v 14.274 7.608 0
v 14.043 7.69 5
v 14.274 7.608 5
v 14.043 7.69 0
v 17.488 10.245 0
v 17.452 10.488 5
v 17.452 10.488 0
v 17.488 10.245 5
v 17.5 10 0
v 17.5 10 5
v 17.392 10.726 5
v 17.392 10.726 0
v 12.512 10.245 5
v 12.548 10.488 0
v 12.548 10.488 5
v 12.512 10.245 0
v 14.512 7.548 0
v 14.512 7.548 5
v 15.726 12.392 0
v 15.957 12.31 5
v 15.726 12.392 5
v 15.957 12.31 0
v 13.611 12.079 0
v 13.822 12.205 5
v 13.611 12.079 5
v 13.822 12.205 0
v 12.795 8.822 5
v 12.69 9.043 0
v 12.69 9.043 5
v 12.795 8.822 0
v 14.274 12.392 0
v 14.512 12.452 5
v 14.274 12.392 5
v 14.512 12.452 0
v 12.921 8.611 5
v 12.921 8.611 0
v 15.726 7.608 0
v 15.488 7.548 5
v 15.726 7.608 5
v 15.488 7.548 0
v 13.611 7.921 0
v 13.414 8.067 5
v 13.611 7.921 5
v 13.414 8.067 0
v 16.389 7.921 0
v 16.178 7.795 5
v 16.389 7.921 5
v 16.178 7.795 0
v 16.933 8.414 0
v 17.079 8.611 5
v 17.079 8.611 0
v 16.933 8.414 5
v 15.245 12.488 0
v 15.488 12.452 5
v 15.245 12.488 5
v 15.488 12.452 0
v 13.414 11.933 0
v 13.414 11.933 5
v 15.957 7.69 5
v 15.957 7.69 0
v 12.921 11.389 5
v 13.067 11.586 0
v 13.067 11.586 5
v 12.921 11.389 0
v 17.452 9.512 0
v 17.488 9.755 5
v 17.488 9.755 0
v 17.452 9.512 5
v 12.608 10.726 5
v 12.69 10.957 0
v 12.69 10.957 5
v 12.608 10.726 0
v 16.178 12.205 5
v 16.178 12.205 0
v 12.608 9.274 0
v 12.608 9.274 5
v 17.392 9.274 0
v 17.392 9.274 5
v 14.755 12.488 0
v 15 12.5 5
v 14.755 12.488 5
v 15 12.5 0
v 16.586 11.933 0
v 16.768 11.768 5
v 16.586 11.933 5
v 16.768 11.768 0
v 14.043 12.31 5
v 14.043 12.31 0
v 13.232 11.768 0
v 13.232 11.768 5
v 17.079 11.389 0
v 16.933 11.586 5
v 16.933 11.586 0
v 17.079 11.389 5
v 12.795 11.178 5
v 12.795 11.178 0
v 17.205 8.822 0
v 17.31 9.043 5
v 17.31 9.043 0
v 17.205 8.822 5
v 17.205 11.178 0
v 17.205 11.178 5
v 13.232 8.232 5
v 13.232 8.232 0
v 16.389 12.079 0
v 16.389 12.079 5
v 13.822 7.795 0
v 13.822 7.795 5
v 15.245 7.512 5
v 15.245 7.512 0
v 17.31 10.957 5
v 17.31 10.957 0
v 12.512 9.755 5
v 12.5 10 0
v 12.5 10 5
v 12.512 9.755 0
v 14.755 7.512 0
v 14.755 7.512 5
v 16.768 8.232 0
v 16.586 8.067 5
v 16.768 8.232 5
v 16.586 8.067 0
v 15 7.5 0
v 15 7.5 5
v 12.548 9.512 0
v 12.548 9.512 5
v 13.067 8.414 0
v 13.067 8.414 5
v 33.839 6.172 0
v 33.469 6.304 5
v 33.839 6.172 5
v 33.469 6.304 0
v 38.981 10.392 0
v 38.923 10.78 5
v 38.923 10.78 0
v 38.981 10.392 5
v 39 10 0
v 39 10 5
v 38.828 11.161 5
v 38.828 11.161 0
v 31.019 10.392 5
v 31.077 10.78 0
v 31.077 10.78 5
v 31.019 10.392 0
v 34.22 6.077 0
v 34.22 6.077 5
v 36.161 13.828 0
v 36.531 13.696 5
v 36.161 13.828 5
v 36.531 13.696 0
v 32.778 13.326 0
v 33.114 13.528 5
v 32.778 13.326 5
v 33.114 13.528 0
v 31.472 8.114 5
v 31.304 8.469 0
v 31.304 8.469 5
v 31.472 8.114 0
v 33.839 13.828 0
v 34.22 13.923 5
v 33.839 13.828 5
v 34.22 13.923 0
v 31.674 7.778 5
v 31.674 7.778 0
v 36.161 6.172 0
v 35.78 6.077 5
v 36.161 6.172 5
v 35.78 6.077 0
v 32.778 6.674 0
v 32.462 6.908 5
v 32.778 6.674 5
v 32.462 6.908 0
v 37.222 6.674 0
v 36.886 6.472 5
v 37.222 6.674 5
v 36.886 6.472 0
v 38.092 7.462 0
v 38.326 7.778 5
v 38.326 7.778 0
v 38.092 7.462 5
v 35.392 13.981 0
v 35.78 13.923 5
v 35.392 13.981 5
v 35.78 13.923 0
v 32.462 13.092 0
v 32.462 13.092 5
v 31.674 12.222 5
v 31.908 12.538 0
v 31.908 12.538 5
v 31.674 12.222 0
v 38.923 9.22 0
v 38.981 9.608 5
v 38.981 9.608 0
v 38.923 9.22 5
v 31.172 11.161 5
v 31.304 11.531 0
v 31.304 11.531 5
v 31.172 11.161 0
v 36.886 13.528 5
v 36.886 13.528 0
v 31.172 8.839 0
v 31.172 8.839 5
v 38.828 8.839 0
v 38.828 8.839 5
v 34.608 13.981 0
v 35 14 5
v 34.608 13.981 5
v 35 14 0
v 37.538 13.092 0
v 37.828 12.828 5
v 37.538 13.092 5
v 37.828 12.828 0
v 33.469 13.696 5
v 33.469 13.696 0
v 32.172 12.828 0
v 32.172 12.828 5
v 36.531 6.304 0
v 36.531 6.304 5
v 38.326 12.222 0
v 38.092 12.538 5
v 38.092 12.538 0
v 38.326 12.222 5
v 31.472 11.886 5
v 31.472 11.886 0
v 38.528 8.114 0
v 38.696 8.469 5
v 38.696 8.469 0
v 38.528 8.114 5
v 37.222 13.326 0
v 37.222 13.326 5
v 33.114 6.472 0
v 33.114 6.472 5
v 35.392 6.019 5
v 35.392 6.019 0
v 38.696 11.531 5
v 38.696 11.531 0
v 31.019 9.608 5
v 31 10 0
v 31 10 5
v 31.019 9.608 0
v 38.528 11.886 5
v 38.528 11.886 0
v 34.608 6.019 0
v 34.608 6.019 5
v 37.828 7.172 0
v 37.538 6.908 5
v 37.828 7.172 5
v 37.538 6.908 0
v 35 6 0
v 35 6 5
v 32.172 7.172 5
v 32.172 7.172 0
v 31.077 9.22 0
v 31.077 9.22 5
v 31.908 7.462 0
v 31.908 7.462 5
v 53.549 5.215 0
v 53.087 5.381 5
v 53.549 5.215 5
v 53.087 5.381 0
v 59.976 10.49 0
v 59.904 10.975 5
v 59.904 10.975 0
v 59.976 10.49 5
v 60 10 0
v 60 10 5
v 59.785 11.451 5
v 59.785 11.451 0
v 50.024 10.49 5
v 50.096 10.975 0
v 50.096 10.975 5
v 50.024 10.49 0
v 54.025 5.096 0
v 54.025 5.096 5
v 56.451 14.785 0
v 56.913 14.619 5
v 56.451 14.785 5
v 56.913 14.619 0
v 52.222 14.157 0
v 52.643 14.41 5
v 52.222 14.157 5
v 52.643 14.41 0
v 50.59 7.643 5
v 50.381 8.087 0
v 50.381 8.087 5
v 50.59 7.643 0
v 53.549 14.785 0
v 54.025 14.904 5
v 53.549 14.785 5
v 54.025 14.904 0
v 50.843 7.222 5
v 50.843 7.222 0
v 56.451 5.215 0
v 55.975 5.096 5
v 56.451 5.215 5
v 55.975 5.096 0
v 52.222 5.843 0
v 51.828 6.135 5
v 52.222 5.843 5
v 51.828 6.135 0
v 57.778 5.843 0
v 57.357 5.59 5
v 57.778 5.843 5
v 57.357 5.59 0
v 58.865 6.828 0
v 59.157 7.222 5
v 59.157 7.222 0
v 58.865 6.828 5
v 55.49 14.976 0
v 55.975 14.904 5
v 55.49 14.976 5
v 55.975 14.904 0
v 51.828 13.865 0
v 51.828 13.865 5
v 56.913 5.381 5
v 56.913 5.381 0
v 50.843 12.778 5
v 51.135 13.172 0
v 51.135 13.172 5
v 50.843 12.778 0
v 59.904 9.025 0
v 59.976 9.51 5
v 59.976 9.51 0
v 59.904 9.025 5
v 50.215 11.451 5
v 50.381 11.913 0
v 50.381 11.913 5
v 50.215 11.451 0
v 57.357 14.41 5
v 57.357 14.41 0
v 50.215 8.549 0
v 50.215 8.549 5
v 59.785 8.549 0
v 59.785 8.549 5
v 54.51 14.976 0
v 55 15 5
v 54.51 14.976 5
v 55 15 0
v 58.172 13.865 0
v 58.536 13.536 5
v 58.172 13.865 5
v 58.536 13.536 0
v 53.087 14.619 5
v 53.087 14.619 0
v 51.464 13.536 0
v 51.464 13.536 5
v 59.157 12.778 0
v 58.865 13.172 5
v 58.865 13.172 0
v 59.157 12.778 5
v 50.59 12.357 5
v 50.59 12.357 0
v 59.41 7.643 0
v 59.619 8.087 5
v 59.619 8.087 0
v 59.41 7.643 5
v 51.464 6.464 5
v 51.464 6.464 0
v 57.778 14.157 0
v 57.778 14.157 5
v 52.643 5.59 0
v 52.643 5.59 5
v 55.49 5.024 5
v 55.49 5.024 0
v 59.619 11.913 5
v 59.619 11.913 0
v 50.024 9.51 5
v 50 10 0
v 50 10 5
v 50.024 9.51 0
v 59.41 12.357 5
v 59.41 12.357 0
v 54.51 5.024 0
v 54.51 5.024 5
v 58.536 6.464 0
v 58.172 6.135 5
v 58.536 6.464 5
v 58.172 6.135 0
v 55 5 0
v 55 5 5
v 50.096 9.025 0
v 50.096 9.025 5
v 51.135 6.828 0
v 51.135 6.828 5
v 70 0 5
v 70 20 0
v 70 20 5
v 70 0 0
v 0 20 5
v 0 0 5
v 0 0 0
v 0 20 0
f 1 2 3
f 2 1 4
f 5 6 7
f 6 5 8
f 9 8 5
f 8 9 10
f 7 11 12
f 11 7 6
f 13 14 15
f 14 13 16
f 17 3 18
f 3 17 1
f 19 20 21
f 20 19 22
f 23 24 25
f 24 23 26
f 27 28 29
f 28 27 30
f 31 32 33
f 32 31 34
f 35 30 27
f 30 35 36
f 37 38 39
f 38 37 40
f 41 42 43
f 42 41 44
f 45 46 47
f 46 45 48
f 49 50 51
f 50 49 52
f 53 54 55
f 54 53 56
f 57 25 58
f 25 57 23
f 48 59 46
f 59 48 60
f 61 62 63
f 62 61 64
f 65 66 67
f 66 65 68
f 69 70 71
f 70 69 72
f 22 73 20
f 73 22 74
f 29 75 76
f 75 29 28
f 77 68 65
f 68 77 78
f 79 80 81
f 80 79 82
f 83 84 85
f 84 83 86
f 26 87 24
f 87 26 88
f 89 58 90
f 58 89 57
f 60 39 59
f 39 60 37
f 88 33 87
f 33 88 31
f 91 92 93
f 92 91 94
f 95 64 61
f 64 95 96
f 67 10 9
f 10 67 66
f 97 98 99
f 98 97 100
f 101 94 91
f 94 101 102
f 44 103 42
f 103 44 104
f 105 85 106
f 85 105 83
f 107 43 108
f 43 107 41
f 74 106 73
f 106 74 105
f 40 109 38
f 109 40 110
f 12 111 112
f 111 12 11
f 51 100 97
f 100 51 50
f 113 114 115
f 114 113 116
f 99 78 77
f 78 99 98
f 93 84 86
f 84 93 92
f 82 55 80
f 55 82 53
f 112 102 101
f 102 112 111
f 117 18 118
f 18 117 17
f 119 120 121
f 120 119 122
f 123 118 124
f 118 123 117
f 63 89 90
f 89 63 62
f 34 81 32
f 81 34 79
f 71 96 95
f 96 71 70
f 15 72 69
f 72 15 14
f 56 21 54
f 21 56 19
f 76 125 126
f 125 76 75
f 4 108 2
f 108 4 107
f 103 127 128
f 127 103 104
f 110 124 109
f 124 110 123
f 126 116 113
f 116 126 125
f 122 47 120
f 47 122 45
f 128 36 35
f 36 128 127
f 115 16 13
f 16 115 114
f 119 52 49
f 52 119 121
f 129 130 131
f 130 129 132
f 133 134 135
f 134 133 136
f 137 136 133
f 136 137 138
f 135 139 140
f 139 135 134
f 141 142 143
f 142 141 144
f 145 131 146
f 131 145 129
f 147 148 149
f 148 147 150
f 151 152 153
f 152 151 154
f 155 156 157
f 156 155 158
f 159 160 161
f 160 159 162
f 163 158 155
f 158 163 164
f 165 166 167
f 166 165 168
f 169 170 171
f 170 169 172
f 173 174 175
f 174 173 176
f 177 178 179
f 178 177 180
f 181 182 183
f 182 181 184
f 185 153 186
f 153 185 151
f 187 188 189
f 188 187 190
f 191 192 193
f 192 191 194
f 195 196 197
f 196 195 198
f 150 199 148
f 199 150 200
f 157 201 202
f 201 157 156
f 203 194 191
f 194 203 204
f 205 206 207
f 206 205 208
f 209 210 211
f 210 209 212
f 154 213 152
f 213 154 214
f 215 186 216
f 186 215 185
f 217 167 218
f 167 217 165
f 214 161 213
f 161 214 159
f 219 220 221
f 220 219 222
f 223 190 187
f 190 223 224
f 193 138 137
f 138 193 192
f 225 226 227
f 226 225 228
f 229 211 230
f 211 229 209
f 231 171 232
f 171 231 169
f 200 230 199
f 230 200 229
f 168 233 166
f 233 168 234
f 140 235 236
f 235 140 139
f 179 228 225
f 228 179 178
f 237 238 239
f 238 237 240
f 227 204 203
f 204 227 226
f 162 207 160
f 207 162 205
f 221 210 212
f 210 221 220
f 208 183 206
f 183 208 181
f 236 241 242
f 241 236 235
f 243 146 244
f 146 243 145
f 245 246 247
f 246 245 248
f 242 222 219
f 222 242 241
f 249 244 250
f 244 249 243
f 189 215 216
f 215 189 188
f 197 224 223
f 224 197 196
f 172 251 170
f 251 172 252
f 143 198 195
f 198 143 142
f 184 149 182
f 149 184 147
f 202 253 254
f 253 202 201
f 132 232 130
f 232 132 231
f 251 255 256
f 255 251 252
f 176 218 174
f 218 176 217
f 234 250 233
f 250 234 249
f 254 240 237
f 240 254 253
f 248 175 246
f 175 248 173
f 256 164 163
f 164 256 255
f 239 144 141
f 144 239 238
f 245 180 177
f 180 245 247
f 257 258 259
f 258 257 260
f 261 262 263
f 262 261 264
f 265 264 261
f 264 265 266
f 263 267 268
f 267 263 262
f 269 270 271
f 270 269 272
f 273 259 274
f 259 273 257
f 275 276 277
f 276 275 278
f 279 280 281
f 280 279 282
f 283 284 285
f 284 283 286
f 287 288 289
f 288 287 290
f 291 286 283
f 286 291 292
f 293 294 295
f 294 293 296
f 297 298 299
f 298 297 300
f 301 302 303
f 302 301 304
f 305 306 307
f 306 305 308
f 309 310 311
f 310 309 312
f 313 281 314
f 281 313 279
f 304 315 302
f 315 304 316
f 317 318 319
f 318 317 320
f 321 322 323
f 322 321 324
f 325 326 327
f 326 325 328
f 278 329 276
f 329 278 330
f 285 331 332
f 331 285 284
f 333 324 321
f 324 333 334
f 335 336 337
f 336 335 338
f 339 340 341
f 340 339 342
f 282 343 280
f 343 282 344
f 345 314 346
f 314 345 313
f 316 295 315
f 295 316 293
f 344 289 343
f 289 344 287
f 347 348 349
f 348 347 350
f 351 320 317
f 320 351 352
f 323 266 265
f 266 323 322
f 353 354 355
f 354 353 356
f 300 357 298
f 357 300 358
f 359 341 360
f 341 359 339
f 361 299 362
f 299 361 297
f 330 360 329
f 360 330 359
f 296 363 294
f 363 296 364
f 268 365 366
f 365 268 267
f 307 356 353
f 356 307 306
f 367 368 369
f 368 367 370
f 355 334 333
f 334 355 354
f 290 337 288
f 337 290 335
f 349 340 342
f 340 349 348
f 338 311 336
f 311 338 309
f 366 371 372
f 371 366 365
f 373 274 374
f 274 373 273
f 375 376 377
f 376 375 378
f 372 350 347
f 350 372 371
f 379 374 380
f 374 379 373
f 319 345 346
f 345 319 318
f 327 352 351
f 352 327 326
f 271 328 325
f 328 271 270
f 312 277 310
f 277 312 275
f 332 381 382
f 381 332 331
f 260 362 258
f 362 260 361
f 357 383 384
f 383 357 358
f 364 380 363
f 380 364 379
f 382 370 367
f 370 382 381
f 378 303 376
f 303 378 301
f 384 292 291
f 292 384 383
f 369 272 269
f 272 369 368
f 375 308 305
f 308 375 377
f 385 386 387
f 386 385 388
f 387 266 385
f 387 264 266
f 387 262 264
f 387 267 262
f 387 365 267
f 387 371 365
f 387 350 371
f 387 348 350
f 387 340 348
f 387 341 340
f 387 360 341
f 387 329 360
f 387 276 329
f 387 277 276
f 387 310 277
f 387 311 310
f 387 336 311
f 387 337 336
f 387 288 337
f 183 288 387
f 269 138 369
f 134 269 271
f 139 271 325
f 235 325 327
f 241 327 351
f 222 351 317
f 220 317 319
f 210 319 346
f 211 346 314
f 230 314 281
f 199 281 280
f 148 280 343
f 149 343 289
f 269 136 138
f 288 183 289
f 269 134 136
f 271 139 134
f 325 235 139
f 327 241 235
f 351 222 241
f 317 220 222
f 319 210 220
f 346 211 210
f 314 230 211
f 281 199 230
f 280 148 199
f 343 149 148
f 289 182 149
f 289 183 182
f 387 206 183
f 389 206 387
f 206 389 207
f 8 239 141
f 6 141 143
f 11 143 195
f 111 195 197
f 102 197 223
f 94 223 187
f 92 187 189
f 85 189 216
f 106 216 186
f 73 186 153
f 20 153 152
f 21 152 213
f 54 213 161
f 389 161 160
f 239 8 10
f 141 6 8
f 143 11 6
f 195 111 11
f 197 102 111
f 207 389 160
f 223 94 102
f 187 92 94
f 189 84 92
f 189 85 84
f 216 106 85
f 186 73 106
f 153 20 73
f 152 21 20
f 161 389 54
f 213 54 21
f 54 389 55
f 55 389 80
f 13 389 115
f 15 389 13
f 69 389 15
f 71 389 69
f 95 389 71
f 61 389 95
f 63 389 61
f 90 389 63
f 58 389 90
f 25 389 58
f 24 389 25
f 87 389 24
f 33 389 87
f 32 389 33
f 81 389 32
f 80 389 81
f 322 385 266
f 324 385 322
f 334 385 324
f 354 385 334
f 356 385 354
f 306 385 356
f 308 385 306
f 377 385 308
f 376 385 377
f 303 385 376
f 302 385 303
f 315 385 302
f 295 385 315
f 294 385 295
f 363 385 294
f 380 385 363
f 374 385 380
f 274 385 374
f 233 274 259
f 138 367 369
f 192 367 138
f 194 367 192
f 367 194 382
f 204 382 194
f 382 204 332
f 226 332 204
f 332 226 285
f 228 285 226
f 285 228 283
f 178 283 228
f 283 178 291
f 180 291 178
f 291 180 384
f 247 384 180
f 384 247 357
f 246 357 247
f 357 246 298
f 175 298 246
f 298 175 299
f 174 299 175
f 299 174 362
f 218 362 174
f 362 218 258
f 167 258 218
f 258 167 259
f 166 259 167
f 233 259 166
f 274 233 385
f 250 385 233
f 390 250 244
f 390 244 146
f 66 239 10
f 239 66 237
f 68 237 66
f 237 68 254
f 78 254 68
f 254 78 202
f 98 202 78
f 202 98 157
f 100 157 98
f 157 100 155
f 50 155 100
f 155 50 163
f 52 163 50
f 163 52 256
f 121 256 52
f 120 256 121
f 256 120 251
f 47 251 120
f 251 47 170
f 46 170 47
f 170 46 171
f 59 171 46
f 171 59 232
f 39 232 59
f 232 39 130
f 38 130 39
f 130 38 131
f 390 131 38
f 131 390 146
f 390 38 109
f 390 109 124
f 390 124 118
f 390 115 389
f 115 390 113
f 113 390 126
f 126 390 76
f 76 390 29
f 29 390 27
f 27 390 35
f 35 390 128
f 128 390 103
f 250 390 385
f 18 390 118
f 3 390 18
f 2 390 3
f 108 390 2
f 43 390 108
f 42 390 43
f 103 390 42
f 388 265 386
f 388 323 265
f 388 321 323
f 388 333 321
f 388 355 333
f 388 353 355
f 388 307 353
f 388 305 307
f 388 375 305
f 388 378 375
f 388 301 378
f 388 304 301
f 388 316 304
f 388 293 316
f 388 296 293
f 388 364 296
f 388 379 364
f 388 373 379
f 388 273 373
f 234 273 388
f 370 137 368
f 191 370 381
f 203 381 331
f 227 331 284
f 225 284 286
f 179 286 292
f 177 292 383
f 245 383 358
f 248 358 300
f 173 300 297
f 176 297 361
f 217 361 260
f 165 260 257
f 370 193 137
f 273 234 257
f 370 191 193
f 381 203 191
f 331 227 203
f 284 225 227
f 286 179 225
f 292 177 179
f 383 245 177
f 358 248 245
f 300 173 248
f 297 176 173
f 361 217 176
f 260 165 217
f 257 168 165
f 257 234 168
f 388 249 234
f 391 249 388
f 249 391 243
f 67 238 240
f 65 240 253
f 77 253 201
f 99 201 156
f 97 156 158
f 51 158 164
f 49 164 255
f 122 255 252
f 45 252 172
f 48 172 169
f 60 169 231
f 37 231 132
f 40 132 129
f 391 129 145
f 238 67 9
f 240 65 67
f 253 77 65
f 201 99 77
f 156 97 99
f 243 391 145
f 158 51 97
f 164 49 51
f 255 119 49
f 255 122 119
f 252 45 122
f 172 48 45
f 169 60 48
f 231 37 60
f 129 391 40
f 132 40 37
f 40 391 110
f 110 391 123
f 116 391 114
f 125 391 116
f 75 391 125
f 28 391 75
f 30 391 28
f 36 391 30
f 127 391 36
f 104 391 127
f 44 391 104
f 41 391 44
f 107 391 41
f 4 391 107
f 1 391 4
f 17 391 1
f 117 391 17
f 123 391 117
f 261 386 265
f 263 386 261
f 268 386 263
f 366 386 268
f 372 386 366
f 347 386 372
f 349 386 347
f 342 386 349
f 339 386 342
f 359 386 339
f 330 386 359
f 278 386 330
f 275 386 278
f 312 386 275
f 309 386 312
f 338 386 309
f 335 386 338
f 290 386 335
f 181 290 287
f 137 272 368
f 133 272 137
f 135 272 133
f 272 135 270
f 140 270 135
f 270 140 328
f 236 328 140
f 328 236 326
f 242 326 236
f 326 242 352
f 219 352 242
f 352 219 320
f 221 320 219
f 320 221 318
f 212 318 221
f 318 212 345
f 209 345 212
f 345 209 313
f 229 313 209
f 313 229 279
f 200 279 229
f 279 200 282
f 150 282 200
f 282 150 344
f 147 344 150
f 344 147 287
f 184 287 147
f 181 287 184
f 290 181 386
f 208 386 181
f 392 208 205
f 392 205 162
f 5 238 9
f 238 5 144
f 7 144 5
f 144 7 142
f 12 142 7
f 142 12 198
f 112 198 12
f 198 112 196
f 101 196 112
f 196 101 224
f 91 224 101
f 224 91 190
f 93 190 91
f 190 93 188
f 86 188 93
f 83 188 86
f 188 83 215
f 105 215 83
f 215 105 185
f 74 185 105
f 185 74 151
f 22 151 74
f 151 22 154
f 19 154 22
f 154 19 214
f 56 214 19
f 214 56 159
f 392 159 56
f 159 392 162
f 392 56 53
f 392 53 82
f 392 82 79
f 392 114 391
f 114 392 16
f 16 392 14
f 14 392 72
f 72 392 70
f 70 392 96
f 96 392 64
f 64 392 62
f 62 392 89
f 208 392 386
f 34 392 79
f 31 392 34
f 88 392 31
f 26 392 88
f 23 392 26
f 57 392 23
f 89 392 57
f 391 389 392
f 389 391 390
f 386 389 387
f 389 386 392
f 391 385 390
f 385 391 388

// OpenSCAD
/*
	hole-compensation — 圆孔阵列 / 孔径补偿标定（5/8/10 mm）

	测什么
		一块 5 mm 厚板上开 5 / 8 / 10 mm 三个通孔。打出来用卡尺或塞规量
		**实际孔径**，差值就是这台机器在该孔径上的孔收缩量。

	怎么判读
		- 补偿量 = 设计孔径 - 实测孔径（通常为正值，FDM 上 0.1–0.3 mm 很常见）。
		- 三个孔径的收缩量不应该差太多；如果 5 mm 孔缩得特别多（>0.3），
		  是圆弧近似 + 层宽不足，换 $fn 更大或加流量能改善。
		- 把测得的补偿量填回 comp（或用 print3d_parts 传 params {"comp": 0.2}），
		  重新导出 → 孔直接画大，外轮廓不受影响。这比切片器里的
		  XY 尺寸补偿更准，因为那份补偿会连外轮廓一起放大。
		- 量孔用内测爪，量三个方向取平均；孔口的喇叭口（第一层塌陷）不要量进去。

	期望值（默认参数）
		STL 体积 6.258 cm³，包围盒 70.00 × 20.00 × 5.00 mm，单实体，水密。
		comp=0 时三个孔的模型直径就是 5 / 8 / 10 mm（$fn=64 正圆）。

	参数
		d_1..3      三个设计孔径 (mm)
		comp        统一加在孔径上的补偿量 (mm)：正值放大孔，负值缩小孔
		plate_w/d/h 板的宽 / 深 / 厚 (mm)
		margin_x    第一个孔中心距板左边缘 (mm)
		pitch       孔间距 (X)
		fn          圆周分段数（孔越小越要够，建议 >= 48）
*/

/* [设计孔径 (mm)] */
d_1 = 5;          // 小孔
d_2 = 8;          // 中孔
d_3 = 10;         // 大孔

/* [间隙补偿 (mm)] */
comp = 0;         // 正值把孔放大：量出缩 0.2 就填 0.2

/* [基板] */
plate_w = 70;     // X
plate_d = 20;     // Y
plate_h = 5;      // Z

/* [布局] */
margin_x = 15;    // 第一个孔中心 X
pitch = 20;       // 孔间距 (X)

/* [网格] */
fn = 64;

holes = [d_1, d_2, d_3];
n_holes = len(holes);

assert(min(holes) > 0, "孔径必须 > 0");
assert(comp > -1 && comp < 2, "comp 超出合理范围（-1 .. 2 mm）");
assert(margin_x + (n_holes - 1) * pitch < plate_w, "孔位超出板宽：加大 plate_w 或减小 pitch");

difference() {
	cube([plate_w, plate_d, plate_h]);
	for (i = [0:n_holes - 1]) {
		// 上下各多切 1 mm，保证通孔，不在板面留零厚度面
		translate([margin_x + i * pitch, plate_d / 2, -1])
			cylinder(h = plate_h + 2, d = holes[i] + comp, $fn = fn);
	}
}
